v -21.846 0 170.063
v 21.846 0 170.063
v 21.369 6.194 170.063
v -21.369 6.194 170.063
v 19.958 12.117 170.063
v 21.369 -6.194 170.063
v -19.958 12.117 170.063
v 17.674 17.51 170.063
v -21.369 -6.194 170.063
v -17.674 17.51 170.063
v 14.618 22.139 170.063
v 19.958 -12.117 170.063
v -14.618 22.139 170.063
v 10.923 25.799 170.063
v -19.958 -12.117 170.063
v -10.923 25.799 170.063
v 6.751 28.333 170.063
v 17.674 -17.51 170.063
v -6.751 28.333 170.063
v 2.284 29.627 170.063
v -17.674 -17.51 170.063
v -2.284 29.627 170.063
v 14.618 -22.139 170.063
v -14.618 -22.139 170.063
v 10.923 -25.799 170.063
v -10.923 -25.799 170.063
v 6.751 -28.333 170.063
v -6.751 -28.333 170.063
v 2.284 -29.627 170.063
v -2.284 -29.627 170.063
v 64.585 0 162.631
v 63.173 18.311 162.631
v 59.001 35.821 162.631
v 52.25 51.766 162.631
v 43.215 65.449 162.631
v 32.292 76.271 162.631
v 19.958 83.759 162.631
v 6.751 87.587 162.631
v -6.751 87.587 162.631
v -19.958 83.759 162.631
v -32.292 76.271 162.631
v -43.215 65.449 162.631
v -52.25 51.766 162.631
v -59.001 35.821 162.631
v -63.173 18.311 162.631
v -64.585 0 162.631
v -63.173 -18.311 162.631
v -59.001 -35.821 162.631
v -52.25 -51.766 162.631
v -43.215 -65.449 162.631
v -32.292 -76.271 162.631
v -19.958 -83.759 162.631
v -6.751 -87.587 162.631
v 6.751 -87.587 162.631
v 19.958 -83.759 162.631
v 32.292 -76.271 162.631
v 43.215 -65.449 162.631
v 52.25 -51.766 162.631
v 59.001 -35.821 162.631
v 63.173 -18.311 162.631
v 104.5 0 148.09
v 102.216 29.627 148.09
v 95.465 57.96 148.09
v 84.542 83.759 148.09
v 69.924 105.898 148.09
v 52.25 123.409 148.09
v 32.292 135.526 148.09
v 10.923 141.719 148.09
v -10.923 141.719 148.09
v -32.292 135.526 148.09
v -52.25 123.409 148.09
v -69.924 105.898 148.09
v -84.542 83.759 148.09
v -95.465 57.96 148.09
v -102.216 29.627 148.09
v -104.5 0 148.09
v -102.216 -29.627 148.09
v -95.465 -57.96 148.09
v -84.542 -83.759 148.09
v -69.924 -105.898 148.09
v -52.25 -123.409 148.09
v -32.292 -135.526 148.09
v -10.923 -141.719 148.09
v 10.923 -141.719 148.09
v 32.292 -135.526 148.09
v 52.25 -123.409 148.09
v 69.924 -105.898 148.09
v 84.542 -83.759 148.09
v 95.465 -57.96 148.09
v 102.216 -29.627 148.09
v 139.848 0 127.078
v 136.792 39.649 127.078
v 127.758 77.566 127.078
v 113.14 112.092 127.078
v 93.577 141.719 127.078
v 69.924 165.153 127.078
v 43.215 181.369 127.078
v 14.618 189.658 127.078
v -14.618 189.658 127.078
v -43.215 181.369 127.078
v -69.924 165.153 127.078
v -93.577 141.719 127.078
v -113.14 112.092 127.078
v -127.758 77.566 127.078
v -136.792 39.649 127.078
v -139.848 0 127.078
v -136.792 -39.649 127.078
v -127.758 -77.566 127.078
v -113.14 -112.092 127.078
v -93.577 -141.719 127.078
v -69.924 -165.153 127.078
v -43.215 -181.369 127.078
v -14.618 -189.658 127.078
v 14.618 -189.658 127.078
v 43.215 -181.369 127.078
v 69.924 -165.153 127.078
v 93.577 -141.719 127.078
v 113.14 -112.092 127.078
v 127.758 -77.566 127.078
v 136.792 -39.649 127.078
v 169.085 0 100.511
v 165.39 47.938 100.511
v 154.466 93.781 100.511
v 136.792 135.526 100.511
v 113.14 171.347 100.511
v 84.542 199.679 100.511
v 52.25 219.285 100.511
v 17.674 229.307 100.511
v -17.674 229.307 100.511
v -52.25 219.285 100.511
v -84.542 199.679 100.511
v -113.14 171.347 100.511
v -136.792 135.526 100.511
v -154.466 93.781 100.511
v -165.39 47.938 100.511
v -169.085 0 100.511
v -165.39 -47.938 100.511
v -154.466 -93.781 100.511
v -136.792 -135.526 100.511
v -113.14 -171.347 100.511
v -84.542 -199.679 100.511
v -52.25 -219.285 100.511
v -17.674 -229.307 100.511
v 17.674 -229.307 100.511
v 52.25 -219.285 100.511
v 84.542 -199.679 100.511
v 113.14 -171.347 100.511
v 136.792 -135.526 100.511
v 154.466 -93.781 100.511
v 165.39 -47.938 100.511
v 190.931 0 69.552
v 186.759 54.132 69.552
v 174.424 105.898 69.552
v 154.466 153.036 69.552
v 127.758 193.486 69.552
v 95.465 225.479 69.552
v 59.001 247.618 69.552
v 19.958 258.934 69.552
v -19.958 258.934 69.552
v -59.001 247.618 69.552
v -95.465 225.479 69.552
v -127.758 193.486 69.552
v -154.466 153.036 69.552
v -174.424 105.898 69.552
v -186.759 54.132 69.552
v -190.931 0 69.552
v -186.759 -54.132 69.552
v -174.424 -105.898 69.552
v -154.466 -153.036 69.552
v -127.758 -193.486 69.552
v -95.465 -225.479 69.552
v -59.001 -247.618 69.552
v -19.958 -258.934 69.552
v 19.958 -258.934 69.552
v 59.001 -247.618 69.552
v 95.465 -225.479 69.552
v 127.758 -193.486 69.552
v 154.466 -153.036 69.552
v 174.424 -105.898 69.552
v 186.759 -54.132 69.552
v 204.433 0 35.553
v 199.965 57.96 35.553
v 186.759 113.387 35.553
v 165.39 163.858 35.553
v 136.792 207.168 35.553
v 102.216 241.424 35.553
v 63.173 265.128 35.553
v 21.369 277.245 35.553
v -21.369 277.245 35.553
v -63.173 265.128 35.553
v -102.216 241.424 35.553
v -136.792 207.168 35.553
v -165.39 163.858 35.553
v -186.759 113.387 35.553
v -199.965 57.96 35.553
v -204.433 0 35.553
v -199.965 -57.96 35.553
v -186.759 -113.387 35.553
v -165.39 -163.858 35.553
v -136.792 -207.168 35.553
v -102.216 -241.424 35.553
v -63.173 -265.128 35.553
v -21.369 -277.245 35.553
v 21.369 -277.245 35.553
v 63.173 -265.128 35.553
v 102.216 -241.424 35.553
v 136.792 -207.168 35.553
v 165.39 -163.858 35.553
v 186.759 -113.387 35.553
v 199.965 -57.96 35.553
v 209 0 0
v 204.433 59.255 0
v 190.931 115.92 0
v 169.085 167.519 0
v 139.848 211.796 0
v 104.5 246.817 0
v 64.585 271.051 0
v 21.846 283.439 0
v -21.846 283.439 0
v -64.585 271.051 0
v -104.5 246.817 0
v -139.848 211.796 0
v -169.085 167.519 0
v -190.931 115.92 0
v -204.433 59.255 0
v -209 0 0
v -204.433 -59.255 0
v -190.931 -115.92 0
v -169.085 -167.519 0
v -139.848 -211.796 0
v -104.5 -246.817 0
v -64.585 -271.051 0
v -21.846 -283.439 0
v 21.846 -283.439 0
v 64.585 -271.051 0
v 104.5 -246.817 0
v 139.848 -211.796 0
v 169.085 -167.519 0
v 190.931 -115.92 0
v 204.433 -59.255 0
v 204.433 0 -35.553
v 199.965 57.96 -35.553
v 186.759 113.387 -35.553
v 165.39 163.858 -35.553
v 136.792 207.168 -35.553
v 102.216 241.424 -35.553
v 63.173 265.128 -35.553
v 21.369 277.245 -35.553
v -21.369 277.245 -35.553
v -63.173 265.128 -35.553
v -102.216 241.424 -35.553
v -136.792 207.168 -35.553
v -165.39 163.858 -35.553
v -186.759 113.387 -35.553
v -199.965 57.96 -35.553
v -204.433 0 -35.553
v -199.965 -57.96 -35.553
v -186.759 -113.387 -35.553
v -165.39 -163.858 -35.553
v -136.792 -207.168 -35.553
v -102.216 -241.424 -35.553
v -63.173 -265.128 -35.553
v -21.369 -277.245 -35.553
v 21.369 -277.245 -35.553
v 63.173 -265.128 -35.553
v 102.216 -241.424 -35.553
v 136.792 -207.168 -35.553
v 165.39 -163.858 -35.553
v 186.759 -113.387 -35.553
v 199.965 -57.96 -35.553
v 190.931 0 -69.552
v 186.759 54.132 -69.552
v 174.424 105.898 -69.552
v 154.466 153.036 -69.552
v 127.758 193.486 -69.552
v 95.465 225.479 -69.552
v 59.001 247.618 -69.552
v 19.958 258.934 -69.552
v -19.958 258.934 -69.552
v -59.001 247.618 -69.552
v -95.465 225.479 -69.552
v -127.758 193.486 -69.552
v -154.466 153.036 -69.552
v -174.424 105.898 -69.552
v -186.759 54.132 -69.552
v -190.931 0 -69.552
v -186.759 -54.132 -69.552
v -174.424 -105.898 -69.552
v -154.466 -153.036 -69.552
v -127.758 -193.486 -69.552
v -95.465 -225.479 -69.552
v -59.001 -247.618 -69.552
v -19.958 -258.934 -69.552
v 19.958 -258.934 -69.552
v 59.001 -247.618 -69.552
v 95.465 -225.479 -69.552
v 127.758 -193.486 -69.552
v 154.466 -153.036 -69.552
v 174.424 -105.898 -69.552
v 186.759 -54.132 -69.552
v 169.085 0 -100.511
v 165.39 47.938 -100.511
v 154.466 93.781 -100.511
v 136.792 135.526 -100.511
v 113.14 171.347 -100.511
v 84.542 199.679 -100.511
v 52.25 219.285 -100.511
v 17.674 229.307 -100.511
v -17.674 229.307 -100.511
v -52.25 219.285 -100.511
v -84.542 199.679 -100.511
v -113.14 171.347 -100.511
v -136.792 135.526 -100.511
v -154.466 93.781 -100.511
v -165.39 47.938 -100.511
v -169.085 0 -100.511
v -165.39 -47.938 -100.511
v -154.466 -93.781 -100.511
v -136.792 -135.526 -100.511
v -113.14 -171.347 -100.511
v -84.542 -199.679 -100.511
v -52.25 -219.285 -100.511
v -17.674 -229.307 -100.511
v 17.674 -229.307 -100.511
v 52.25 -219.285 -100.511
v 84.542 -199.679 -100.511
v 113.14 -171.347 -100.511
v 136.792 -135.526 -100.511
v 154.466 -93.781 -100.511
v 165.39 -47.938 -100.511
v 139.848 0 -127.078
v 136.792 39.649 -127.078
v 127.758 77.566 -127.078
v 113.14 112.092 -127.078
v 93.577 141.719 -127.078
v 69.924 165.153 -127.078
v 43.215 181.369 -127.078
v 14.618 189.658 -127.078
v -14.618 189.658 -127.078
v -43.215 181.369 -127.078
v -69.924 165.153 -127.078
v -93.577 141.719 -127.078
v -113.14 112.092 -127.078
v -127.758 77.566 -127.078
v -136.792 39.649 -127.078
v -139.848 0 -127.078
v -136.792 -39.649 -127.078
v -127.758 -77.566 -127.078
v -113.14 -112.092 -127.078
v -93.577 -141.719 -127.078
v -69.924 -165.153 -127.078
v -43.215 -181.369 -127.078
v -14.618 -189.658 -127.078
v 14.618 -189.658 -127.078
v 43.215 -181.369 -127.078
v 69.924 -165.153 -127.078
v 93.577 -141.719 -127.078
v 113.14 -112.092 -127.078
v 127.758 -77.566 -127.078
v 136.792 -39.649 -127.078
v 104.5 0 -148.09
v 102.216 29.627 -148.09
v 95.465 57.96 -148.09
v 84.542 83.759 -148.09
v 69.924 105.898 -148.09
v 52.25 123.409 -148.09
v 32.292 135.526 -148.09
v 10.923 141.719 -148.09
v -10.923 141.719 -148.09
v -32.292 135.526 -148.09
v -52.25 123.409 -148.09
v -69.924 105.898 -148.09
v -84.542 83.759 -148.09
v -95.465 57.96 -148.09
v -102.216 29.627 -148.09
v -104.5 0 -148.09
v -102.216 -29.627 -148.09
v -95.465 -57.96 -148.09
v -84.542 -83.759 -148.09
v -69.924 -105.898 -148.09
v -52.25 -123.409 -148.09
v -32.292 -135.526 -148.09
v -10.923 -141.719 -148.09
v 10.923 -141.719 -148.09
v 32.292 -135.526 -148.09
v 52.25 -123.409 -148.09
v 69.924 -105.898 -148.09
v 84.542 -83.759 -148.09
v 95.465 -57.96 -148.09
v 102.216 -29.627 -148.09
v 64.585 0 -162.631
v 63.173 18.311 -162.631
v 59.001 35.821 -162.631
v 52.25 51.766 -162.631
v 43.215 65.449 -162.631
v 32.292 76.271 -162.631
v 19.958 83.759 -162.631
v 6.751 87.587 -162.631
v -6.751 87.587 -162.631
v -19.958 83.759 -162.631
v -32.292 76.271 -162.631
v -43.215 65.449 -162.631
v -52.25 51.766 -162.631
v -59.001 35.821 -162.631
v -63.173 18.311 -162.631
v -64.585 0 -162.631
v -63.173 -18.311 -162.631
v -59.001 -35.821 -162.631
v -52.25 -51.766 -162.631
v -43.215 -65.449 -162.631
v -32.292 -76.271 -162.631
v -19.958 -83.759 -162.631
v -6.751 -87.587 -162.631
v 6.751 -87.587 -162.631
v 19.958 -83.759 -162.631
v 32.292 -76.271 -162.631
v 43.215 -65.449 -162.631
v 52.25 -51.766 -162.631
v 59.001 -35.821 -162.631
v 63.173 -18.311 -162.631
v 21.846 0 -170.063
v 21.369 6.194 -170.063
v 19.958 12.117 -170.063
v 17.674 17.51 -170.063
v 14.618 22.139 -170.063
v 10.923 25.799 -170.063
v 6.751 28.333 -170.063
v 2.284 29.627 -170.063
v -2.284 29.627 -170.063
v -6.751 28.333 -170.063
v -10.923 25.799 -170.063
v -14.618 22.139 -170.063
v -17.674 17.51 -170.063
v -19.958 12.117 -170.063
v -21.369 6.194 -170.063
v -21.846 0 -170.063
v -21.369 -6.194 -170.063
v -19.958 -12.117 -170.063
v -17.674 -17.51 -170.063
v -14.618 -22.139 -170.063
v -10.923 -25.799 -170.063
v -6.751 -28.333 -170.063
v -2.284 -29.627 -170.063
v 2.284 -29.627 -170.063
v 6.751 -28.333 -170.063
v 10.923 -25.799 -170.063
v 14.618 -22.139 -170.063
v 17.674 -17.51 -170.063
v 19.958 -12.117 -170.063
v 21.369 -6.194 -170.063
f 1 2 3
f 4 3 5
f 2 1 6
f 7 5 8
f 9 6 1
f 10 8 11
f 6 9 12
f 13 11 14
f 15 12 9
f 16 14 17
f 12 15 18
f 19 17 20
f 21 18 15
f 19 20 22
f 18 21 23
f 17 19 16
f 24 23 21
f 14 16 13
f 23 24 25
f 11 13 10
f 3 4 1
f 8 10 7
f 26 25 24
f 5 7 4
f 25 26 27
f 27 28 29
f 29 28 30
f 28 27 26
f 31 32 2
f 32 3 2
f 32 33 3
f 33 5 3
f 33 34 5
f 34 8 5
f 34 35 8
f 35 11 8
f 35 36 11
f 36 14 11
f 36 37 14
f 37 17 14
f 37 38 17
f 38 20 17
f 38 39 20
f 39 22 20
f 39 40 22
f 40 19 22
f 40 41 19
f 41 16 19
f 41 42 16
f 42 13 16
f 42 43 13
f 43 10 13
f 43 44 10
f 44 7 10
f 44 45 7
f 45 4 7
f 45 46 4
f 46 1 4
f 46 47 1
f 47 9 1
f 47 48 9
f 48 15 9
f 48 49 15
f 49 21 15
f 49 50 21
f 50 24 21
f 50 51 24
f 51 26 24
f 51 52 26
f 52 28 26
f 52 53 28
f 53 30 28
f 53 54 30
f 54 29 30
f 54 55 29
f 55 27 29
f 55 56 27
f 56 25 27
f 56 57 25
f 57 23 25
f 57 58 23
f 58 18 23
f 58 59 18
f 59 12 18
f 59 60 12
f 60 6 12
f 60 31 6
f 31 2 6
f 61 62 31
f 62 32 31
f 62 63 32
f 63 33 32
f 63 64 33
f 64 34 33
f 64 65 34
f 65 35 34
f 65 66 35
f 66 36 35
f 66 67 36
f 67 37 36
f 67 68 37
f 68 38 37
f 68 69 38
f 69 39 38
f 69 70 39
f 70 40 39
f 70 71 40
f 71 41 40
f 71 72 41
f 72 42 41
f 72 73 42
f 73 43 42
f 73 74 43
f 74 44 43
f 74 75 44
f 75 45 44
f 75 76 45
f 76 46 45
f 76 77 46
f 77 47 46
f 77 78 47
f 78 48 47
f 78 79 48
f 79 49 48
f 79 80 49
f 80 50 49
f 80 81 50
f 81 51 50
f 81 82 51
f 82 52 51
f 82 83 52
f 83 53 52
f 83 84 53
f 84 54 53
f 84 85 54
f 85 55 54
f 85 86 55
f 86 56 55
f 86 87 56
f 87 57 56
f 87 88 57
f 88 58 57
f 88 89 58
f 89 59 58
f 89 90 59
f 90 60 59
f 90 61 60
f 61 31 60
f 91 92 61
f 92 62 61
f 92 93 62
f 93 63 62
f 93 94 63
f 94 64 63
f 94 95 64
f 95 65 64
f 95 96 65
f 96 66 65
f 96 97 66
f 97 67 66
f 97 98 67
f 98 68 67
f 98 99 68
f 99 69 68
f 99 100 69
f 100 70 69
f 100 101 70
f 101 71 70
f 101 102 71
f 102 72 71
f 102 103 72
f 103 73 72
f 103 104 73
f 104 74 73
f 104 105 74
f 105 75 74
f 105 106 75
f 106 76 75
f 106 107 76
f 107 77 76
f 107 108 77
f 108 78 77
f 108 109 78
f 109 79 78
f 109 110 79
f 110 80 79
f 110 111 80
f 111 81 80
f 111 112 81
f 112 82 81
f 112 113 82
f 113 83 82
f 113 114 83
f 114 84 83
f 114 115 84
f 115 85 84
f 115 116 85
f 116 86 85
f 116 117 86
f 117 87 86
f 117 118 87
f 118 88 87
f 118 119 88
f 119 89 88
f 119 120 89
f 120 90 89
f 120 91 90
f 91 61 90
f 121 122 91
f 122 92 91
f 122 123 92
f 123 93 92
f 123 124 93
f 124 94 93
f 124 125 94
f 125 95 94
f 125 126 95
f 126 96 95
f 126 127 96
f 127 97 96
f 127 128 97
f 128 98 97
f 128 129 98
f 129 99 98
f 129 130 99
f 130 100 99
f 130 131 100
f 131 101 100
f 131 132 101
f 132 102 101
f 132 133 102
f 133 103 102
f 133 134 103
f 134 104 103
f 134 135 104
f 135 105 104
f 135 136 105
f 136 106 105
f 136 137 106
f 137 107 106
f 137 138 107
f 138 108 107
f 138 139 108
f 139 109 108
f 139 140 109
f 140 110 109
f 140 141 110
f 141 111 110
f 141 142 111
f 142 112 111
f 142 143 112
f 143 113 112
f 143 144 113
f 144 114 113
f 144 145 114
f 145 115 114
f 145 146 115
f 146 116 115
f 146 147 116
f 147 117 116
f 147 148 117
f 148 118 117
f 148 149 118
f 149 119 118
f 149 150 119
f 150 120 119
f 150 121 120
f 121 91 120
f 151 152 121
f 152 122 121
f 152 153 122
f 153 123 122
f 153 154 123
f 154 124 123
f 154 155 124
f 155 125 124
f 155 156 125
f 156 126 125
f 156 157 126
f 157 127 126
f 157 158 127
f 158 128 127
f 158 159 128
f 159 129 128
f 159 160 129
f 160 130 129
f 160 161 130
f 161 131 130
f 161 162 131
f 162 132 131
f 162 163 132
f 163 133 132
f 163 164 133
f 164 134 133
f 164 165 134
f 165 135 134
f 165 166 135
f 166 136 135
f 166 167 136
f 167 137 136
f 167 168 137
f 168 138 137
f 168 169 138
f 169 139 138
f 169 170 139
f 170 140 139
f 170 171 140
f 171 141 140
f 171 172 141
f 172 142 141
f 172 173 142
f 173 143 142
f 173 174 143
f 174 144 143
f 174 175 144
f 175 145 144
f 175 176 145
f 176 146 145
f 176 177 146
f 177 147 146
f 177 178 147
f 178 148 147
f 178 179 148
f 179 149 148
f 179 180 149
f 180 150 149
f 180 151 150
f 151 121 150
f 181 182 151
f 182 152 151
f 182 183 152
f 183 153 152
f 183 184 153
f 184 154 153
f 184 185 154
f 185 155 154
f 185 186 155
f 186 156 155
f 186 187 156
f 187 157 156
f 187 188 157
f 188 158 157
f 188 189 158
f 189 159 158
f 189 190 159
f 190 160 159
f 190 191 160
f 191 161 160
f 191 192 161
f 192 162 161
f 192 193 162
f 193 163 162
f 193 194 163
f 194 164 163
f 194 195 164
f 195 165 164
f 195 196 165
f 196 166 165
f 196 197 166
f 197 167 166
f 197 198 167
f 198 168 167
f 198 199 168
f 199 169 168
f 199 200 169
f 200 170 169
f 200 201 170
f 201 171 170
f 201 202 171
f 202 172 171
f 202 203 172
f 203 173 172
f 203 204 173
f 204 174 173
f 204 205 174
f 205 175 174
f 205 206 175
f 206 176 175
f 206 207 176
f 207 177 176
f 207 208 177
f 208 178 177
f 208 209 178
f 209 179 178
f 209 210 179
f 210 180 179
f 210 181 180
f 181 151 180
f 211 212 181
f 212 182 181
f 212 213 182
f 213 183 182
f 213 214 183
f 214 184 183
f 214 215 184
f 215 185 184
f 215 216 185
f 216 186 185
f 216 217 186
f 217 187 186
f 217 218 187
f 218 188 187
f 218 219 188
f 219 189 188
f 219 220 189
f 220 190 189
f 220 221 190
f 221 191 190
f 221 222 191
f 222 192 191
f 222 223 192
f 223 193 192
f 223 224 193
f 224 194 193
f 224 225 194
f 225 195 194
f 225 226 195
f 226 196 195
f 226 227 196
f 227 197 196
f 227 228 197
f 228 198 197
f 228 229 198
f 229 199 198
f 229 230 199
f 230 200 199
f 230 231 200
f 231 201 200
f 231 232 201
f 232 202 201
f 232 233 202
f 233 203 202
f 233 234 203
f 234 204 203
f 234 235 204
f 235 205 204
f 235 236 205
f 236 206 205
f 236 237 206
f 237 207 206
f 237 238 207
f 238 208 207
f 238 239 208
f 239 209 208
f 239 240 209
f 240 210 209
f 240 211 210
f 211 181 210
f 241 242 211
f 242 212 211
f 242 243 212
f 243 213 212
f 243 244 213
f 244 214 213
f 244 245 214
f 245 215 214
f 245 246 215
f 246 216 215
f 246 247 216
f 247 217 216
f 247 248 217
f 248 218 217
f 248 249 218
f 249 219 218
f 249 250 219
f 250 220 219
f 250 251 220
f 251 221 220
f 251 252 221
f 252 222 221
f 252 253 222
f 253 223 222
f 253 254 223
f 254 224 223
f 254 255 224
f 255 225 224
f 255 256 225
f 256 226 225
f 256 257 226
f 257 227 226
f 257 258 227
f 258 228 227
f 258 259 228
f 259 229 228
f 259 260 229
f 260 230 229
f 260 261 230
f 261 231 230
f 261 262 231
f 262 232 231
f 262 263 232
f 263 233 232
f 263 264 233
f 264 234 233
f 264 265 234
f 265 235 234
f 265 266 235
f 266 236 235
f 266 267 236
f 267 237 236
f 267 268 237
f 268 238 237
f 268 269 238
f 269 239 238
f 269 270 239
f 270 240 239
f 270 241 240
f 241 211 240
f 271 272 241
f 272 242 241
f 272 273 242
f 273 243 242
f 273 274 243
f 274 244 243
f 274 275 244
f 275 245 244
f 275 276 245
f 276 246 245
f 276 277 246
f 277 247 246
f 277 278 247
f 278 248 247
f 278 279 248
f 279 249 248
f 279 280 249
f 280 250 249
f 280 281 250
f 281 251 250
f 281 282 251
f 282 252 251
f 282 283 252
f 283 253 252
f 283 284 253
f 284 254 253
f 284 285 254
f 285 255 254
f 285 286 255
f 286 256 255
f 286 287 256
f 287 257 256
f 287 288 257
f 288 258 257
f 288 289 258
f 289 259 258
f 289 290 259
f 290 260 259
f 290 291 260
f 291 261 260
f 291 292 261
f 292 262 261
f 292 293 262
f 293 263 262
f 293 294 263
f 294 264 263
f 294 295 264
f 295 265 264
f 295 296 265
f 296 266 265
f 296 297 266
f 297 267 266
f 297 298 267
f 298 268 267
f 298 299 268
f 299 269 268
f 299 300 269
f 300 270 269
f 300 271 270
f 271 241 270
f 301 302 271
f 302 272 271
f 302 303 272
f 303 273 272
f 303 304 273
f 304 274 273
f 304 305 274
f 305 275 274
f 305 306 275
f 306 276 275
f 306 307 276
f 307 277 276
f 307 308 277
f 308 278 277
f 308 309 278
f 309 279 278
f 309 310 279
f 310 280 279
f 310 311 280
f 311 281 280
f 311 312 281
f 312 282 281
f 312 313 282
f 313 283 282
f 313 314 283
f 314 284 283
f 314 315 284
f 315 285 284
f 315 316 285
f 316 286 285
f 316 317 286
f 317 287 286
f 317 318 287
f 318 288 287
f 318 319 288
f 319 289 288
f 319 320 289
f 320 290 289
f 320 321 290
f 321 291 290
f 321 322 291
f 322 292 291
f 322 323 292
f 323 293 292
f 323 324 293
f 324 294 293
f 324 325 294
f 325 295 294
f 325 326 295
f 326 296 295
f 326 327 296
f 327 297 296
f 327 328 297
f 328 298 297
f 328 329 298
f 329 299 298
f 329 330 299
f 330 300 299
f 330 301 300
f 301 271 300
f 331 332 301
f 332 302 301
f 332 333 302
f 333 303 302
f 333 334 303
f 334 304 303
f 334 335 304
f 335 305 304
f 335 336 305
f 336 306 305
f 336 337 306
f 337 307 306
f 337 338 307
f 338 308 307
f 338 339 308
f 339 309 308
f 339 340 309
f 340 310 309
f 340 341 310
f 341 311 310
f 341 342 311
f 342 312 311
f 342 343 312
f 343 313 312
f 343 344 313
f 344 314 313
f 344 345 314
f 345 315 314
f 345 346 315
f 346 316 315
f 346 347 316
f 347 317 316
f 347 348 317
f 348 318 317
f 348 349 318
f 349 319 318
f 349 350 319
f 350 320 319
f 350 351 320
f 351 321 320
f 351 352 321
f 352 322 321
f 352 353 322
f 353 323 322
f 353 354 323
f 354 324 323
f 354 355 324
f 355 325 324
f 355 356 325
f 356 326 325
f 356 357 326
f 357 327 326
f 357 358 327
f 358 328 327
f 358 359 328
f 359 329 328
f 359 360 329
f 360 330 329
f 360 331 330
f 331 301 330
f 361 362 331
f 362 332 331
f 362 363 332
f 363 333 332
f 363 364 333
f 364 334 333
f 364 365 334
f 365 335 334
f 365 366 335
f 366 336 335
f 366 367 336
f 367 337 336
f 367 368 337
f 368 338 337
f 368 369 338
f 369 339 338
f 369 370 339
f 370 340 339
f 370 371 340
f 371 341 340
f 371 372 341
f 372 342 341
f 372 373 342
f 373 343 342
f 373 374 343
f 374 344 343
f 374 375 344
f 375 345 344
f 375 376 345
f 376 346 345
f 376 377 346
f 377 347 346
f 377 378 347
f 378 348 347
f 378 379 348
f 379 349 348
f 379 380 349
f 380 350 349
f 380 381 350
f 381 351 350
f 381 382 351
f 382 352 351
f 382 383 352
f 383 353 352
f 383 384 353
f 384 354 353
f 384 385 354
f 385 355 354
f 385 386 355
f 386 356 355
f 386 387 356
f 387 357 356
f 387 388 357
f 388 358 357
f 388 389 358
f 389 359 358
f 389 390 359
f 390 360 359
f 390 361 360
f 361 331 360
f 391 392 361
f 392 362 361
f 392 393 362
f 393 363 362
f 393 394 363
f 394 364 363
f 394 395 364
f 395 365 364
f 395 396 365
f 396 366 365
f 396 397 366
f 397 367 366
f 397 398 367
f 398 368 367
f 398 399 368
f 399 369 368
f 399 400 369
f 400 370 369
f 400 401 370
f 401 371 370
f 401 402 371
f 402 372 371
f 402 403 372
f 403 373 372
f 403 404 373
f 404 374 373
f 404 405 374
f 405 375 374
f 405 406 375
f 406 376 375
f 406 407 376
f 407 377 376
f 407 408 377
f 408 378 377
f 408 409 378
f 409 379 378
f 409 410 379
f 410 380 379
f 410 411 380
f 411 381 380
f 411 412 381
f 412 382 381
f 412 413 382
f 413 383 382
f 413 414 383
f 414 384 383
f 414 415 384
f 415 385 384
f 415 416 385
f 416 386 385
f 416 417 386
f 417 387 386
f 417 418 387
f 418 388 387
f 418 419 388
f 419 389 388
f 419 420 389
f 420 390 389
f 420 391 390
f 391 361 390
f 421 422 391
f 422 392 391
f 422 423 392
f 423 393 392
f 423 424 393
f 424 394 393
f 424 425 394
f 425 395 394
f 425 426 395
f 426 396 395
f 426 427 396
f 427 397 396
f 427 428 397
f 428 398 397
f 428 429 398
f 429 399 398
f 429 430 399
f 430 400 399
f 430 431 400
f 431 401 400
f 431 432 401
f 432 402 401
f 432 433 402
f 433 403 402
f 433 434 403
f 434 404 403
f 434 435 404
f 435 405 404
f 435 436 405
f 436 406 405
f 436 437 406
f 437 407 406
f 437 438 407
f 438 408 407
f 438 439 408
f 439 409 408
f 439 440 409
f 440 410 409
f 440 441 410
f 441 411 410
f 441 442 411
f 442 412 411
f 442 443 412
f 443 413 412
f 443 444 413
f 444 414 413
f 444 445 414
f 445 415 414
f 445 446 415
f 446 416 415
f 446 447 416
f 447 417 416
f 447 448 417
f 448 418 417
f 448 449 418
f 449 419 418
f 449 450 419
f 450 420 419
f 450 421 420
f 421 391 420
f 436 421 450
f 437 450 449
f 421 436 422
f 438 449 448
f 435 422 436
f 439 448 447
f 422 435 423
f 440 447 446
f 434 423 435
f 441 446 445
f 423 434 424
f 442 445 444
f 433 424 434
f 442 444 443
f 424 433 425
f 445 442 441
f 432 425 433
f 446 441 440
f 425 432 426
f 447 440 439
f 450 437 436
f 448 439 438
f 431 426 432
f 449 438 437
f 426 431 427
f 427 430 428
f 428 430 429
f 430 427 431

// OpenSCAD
// Generated by SolidPython 1.0.1 on 2020-07-29 00:46:50


scale(v = [11, 15, 9]) {
	sphere(r = 19);
}
/***********************************************
*********      SolidPython code:      **********
************************************************
 
# import packages: SolidPython
from solid import *
from solid.utils import *
from itertools import chain, combinations, permutations


class Resize:

    def __init__(self, scad_file):
        self.scad_file = scad_file
        #self.scad_file = import_scad(scad_file)
        # cone/cylinder param:
        self.r1 = 0
        self.r2 = 0
        self.h = 0
        # rectangular prism param:
        self.w = 0
        self.l = 0
        # ellipse param:
        self.r = 0

    # import OpenScad code (file name corresponds to shape)


    # classify shape + parameters
    def assign(self, param1, param2, param3):
        if self.scad_file == 'cone.scad':
            self.r1 = param1
            self.r2 = param2
            self.h = param3
        elif self.scad_file == 'cylinder.scad':
            self.r1 = param1
            self.r2 = param2
            self.h = param3
        elif self.scad_file == 'rectangularPrism.scad':
            self.h = param1
            self.l = param2
            self.w = param3
        else:
            self.r = param1
            self.h = param2

    # resize parameters
    def iterate(self):
        x = range(3, 20, 2)
        i = 1
        if self.scad_file == 'cone.scad':
            tempList = list(permutations(x, 2))
            for temp in tempList:
                param1 = temp[0]
                param2 = temp[1]
                filepath = 'produced_scad_files/' + 'cone' + str(param1) + '_' + str(param2) + '_' + '.scad'
                scad_render_to_file(cylinder(h=param1, r1=param2, r2=0), filepath)

        elif self.scad_file == 'cylinder.scad':
            tempList = list(permutations(x, 3))
            for temp in tempList:
                param1 = temp[0]
                param2 = temp[1]
                filepath = 'produced_scad_files/' + 'cylinder' + str(param1) + '_' + str(param2) + '_' + '.scad'
                scad_render_to_file(cylinder(h=param1, r1=param2, r2=param2), filepath)

        elif self.scad_file == 'rectangularPrism.scad':
            tempList = list(permutations(x, 3))
            for temp in tempList:
                param1 = temp[0]
                param2 = temp[1]
                param3 = temp[2]
                filepath = 'produced_scad_files/' + 'rectangularPrism' + str(param1) + '_' + str(param2) + '_' + str(
                    param3) + '.scad'
                scad_render_to_file(cube(size=(param1, param2, param3)), filepath)

        elif self.scad_file == 'ellipse.scad':
            tempList = list(permutations(x, 4))
            for temp in tempList:
                param1 = temp[0]
                param2 = temp[1]
                param3 = temp[2]
                param4 = temp[3]
                filepath = 'produced_scad_files/' + 'ellipse' + str(param1) + '_' + str(param2) + '_' + str(param3) + '_' + str(param4) + '.scad'
                scad_render_to_file(scale([param1, param2, param3])(sphere(r=param4)), filepath)

    def render_to_scadfile(self):
        scad_render_to_file(scad, 'example.scad') 
 
************************************************/
